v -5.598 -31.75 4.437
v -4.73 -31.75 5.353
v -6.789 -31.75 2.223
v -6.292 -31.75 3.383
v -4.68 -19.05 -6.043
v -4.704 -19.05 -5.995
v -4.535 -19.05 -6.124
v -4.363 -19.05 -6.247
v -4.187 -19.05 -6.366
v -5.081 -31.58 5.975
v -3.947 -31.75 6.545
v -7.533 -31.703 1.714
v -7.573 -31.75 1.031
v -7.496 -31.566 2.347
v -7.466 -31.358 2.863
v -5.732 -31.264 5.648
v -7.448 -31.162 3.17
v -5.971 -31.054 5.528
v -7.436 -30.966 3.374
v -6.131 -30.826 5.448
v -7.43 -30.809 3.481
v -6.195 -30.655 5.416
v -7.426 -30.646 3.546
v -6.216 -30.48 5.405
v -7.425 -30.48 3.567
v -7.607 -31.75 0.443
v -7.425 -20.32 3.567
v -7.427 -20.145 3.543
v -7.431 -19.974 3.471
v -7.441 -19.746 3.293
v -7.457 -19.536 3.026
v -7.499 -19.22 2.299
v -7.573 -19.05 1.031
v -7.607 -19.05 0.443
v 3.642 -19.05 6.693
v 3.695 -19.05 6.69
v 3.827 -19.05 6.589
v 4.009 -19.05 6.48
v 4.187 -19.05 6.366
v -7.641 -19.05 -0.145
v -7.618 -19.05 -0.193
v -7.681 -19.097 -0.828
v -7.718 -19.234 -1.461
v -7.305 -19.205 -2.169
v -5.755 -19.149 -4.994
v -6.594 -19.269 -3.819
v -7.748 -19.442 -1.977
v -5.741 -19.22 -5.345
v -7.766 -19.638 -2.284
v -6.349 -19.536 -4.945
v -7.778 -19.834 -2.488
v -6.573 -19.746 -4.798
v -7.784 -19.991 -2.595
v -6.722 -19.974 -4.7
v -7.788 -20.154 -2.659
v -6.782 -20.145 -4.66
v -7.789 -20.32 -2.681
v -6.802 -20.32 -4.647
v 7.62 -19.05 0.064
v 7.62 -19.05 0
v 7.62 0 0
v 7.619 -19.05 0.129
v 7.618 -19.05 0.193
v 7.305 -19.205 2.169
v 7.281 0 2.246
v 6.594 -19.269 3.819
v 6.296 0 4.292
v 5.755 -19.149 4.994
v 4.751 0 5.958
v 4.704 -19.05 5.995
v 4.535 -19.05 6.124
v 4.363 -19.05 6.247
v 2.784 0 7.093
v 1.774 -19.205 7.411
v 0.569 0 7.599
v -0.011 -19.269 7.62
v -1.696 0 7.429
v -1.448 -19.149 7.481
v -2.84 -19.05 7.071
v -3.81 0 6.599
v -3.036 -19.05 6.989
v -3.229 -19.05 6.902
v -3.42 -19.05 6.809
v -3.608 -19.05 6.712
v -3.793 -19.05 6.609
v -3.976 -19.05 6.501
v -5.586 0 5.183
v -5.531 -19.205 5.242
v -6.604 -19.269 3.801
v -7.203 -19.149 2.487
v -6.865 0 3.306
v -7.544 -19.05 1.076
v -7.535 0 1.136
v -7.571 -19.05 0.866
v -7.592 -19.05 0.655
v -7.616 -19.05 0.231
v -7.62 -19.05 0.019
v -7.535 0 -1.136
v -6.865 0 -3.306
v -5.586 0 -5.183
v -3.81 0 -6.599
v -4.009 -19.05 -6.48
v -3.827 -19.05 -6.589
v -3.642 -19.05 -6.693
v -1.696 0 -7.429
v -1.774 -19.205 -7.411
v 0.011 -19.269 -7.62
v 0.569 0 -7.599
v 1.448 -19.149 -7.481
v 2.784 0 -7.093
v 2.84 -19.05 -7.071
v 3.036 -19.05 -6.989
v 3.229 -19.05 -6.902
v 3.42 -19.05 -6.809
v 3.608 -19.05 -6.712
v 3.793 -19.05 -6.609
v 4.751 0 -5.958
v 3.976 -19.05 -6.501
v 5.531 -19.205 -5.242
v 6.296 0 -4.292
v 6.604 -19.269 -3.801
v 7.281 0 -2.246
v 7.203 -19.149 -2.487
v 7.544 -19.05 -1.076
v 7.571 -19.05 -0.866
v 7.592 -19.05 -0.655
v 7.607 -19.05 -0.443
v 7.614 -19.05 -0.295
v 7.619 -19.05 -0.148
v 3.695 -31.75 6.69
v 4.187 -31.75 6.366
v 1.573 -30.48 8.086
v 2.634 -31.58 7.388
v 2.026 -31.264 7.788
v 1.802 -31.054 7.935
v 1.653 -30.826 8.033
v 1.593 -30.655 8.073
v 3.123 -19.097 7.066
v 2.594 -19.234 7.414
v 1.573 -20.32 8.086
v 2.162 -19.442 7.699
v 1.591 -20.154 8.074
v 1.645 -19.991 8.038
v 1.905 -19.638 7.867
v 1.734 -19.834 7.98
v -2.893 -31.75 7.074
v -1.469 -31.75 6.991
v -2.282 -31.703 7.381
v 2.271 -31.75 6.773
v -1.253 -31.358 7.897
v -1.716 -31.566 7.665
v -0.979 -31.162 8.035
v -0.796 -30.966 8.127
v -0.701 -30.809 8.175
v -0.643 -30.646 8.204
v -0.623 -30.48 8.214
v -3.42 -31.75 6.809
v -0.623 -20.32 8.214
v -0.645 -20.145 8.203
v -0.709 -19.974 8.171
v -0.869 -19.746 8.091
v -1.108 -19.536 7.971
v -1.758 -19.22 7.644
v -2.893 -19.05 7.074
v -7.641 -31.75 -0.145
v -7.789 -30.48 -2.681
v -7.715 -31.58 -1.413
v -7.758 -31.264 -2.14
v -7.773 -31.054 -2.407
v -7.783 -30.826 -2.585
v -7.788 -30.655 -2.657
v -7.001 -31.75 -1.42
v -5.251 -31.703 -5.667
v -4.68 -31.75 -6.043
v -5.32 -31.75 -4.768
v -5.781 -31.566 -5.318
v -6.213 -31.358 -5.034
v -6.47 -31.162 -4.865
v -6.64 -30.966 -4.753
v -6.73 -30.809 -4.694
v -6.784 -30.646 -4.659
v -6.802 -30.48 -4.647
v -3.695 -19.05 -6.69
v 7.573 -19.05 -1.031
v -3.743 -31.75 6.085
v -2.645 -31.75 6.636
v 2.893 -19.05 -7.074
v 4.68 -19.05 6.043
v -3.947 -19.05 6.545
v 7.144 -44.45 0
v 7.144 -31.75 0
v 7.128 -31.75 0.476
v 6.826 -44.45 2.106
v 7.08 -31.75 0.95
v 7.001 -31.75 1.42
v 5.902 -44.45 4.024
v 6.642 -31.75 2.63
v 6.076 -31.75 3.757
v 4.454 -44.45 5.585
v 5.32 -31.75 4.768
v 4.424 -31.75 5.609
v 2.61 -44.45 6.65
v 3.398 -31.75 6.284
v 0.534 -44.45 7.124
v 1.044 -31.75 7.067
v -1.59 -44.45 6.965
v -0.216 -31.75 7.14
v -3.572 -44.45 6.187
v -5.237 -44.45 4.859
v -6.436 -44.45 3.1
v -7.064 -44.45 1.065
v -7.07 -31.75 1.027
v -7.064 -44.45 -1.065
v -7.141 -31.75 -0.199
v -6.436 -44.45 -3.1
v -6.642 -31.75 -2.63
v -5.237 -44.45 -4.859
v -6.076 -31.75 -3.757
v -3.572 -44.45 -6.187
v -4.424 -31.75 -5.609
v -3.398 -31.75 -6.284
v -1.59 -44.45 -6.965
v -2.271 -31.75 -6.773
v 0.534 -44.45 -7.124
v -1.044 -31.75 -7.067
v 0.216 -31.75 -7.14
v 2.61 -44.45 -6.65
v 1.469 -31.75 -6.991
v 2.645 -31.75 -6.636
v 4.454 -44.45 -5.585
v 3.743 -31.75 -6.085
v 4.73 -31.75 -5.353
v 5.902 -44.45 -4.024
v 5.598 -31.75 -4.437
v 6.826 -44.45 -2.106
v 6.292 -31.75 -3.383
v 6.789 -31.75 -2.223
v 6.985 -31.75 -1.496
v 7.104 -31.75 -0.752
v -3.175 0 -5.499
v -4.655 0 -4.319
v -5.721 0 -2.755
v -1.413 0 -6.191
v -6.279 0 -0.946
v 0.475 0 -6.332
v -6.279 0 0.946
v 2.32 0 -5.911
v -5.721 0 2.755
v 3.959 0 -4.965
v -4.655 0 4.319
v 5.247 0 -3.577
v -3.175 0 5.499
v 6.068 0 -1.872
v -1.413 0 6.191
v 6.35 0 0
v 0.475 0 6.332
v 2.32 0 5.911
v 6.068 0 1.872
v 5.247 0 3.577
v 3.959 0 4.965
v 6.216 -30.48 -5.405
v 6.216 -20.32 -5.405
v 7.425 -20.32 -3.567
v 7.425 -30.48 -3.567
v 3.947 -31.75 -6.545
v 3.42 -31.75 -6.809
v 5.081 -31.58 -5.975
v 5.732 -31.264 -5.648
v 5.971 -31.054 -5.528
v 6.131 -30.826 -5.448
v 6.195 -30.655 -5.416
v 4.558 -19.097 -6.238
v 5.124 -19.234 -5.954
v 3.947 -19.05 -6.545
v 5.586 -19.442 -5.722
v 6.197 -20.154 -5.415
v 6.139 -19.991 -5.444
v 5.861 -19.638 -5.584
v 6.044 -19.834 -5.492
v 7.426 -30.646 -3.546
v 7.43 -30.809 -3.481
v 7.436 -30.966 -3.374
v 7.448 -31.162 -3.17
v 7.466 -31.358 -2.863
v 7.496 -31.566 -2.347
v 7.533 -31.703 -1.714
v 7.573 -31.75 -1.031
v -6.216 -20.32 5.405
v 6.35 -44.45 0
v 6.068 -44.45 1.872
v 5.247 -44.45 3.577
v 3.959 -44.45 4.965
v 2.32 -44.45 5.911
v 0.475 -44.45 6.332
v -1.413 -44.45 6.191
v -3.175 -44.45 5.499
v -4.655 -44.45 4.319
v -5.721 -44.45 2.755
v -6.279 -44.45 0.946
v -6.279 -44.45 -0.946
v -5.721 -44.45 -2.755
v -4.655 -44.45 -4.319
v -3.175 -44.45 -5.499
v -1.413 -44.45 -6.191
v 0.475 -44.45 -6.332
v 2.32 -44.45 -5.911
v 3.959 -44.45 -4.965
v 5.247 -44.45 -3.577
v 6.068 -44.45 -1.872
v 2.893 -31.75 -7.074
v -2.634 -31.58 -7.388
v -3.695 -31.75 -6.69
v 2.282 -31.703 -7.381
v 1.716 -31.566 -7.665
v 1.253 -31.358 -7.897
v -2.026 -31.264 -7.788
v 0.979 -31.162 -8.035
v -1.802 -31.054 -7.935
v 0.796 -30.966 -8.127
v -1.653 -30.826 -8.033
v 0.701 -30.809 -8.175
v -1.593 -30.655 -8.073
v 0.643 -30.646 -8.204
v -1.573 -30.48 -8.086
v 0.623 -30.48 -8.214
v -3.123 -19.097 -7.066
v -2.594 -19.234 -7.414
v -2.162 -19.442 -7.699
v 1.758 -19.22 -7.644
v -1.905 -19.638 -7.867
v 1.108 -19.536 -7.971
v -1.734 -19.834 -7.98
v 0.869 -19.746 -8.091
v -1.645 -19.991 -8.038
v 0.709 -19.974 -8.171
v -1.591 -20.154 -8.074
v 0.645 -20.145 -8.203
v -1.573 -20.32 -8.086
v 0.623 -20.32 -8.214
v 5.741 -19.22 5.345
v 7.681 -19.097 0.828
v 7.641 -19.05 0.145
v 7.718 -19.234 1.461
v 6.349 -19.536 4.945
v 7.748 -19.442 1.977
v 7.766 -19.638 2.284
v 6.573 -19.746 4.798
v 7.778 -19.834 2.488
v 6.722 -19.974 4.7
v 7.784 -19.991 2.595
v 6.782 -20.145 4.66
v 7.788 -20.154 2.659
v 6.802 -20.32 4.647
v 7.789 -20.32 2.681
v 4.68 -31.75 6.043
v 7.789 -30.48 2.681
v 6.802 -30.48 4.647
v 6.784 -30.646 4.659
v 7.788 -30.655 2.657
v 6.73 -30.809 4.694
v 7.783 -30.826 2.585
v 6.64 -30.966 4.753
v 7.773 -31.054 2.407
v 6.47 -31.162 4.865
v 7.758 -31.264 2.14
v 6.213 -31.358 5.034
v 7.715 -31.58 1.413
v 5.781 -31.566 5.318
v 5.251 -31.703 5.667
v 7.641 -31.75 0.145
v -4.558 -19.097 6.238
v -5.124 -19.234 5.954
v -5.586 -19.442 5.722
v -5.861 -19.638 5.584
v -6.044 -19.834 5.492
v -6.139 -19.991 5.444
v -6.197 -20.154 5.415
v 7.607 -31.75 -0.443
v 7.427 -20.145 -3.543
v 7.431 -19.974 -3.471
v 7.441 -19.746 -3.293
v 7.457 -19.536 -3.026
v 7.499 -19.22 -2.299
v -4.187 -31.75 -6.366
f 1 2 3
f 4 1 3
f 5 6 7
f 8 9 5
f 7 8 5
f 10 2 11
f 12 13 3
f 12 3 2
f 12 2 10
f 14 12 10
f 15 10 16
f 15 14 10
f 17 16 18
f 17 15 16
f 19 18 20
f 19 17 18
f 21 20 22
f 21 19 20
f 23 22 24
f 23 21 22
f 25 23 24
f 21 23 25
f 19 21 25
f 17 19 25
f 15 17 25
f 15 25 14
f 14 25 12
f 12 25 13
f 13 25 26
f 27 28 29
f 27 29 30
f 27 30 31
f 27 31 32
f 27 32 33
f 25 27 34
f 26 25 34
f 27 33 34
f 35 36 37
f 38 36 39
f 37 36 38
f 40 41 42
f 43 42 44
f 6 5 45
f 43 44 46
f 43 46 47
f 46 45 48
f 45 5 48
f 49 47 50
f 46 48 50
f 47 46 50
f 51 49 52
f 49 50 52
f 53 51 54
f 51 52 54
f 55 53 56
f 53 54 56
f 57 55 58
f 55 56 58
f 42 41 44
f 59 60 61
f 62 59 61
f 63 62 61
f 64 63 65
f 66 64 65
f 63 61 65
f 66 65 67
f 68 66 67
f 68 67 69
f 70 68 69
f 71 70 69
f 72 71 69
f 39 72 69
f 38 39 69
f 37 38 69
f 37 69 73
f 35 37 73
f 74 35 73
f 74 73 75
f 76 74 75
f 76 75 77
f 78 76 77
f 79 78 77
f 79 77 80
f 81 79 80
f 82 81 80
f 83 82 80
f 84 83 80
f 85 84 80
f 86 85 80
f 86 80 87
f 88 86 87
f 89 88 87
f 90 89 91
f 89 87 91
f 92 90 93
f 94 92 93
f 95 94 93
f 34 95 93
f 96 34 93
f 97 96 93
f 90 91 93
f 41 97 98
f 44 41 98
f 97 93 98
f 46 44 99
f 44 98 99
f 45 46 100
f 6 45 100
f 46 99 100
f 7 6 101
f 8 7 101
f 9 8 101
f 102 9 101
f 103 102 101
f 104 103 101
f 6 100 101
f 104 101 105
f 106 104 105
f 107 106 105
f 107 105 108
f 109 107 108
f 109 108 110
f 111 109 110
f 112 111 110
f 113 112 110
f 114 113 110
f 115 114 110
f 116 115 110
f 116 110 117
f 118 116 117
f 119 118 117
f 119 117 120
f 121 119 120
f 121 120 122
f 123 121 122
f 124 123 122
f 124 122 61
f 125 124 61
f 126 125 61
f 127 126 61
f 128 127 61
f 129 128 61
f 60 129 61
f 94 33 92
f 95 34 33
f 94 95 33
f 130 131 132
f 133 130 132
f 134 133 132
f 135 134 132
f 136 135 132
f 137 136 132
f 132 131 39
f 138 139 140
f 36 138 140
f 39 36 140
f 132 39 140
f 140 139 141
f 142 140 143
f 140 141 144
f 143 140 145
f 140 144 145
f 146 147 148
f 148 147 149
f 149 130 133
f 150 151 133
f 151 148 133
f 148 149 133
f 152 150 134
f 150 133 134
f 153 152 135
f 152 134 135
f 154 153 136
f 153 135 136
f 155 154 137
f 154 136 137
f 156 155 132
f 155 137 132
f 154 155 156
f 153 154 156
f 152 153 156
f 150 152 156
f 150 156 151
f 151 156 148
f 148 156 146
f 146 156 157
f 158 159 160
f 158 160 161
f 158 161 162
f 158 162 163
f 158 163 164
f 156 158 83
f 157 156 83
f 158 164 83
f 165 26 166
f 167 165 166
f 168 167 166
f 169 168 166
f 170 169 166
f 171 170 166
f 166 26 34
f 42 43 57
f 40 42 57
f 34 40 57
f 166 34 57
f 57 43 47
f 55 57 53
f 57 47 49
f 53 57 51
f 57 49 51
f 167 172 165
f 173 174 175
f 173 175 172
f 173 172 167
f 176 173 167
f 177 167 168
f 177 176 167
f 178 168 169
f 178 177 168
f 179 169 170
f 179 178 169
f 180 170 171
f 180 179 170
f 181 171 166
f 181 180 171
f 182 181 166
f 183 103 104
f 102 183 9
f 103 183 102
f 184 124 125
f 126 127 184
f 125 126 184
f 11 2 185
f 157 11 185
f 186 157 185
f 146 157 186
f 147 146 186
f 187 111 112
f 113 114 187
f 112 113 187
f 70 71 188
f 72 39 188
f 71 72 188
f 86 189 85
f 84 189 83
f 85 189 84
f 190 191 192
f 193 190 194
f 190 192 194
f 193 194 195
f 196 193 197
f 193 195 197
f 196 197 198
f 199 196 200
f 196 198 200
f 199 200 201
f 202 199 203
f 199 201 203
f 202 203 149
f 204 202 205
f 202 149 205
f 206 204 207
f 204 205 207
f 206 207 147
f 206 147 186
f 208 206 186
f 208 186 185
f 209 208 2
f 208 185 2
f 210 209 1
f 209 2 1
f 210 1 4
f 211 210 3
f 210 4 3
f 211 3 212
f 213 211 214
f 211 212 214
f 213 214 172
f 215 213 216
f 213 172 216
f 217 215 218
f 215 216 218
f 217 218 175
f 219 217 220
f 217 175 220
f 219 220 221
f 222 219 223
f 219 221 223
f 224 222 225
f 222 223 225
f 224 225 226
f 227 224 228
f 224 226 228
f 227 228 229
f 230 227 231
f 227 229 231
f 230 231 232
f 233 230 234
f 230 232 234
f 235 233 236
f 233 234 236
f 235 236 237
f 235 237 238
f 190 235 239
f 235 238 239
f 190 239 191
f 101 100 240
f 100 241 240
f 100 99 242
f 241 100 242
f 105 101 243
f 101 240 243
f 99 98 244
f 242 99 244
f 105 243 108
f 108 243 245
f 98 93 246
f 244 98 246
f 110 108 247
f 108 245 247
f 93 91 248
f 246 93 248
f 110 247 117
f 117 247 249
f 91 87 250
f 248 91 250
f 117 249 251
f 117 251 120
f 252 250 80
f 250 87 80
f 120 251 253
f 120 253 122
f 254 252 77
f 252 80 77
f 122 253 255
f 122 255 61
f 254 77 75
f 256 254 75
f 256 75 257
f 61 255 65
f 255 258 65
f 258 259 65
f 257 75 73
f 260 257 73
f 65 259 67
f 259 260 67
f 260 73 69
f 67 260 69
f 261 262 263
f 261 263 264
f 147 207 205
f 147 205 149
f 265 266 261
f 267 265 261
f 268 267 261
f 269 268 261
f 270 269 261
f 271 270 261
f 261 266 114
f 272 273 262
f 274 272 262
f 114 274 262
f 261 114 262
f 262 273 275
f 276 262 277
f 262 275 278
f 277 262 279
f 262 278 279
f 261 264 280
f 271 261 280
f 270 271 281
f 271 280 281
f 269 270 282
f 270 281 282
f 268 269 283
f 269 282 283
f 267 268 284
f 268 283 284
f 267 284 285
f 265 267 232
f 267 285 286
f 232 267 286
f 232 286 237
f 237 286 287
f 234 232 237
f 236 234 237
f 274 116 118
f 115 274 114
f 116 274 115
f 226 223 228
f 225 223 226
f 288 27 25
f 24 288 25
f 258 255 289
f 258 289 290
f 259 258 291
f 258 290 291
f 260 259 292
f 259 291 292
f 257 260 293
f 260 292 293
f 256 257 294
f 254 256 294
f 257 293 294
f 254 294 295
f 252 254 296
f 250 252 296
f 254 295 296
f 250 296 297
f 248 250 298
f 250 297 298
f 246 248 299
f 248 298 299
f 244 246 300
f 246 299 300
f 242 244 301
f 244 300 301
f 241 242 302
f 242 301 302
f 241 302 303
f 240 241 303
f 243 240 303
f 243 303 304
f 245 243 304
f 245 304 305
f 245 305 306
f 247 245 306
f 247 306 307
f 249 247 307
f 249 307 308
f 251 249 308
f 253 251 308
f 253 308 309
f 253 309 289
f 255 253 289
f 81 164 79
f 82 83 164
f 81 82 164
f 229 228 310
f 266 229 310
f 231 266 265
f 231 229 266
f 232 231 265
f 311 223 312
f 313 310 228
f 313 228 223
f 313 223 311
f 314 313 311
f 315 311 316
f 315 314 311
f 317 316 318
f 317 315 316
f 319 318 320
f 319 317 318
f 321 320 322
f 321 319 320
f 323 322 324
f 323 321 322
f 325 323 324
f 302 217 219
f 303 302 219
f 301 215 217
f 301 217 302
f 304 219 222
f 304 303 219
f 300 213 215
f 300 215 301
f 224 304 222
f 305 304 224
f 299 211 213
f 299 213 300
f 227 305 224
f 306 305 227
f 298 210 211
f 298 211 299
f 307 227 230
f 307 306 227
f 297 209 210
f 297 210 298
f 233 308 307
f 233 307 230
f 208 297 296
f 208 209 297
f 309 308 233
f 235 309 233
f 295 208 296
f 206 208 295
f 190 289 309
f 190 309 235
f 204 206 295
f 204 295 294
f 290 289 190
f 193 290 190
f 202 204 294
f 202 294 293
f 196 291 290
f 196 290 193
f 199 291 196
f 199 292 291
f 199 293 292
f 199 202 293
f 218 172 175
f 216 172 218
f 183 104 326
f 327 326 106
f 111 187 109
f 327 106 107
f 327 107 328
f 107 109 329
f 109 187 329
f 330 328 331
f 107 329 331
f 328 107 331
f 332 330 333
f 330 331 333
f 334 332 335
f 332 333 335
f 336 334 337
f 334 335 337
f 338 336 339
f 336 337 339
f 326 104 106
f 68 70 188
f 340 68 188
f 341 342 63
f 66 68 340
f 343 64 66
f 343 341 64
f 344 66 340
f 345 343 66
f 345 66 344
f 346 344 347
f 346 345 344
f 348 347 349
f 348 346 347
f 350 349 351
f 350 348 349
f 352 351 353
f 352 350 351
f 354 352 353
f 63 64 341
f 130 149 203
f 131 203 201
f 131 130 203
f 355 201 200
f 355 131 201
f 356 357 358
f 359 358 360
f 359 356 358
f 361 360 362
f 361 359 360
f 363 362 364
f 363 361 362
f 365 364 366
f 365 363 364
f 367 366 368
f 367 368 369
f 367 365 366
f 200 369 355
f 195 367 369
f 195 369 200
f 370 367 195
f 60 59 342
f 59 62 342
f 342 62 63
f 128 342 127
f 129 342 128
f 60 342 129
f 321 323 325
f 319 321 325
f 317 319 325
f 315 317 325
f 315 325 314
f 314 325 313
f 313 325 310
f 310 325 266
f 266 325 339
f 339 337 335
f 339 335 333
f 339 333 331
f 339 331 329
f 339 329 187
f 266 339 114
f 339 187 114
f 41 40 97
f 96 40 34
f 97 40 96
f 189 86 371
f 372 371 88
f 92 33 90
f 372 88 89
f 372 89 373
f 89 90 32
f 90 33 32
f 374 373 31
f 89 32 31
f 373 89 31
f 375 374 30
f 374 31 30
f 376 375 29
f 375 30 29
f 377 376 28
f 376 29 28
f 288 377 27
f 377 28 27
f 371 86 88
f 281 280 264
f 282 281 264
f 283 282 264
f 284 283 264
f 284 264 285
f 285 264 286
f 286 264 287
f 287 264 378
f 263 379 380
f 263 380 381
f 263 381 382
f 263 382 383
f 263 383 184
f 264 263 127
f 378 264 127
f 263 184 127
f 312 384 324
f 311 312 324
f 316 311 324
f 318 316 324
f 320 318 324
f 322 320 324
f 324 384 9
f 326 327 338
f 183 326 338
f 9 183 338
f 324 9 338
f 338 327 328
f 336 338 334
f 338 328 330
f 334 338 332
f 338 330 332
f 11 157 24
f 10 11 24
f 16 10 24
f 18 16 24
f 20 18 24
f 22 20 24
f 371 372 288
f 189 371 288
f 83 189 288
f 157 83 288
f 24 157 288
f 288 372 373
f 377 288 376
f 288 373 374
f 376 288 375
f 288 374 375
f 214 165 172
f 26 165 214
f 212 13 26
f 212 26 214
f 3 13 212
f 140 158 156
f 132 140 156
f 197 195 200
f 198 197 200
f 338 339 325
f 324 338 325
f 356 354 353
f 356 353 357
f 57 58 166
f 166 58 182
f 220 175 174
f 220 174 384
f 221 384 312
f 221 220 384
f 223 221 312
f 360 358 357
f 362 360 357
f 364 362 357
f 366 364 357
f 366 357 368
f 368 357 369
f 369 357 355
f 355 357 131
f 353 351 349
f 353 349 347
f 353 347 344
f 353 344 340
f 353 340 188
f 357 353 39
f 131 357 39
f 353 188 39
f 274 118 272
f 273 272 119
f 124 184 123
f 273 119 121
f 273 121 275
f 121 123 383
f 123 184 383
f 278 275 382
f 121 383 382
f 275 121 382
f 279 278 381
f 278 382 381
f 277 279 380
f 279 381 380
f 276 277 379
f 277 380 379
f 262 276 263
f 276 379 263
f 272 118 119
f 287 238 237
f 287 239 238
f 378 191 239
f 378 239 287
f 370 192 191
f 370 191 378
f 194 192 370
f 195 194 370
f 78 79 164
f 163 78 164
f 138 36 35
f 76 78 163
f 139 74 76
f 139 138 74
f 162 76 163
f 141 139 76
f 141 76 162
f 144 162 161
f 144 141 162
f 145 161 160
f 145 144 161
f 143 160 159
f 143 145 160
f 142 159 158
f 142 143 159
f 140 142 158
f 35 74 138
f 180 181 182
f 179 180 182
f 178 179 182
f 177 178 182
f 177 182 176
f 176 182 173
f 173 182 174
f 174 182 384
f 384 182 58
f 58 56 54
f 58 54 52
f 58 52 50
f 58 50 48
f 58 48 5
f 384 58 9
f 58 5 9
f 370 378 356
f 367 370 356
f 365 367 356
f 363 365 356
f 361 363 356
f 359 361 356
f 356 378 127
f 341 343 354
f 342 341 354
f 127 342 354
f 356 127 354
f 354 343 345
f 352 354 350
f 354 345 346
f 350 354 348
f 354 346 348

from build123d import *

# Parameters (mm, degrees)
F0_R         = 7.62
F1_DEPTH     = 19.05
F3_DEPTH     = 12.7
F4_SIZE      = 1.27
F5_T1_DEPTH  = 8.5497045256
F5_T3_DEPTH  = 8.5497045256
F5_T5_DEPTH  = 8.5497045256
F5_T7_DEPTH  = 8.5497045256
F5_T12_DEPTH = 8.5497045256
F5_S13_R     = 7.62
F5_T14_DEPTH = 6
F5_T18_DEPTH = 8.5497045256
F5_S19_R     = 7.62
F5_T20_DEPTH = 6
F5_T24_DEPTH = 8.5497045256
F5_S25_R     = 7.62
F5_T26_DEPTH = 6
F5_T30_DEPTH = 8.5497045256
F5_S31_R     = 7.62
F5_T32_DEPTH = 6
F5_T36_DEPTH = 8.5497045256
F5_S37_R     = 7.62
F5_T38_DEPTH = 6
F5_T42_DEPTH = 8.5497045256
F5_S43_R     = 7.62
F5_T44_DEPTH = 6
F6_R         = 7.14375
F7_DEPTH     = 12.7
F8_R         = 6.35
F9_DEPTH     = 44.4510001


# Not quite as in the source:
# - a fillet or chamfer that OpenCascade refuses, or shapes differently, is made with other operations: its cross-section is extruded or revolved along the edge and cut away or added


with BuildPart() as f1:
    # F0 (on Front) → F1 (new body)
    with BuildSketch(Plane.XZ):
        Circle(F0_R)
    extrude(amount=F1_DEPTH)

    # F2 (on face) → F3 (join)
    with BuildSketch(Plane.XZ.offset(19.05)):
        with BuildLine():
            Line((7.8629215405, 3.9488814679), (4.1872753391, 6.3664059904))
            ThreePointArc((4.1872753391, 6.3664059904), (6.7071394083, 3.6164459015), (7.62, 0))
            ThreePointArc((7.62, 0), (7.616776064, -0.2216357159), (7.6071069841, -0.4430838887))
            Line((7.6071069841, -0.4430838887), (7.8629215405, 3.9488814679))
        make_face()
        with BuildLine():
            ThreePointArc((4.1872753391, 6.3664059904), (0.4430838236, 7.6071069879), (-3.4198316443, 6.8094898138))
            ThreePointArc((-3.4198316443, 6.8094898138), (-6.3664059346, 4.187275424), (-7.6071069765, 0.4430840189))
            ThreePointArc((-7.6071069765, 0.4430840189), (-6.8094898664, -3.4198315396), (-4.187275378, -6.3664059648))
            ThreePointArc((-4.187275378, -6.3664059648), (-0.4430838337, -7.6071069873), (3.419831668, -6.8094898019))
            ThreePointArc((3.419831668, -6.8094898019), (6.3664059777, -4.1872753585), (7.6071069841, -0.4430838887))
            ThreePointArc((7.6071069841, -0.4430838887), (7.616776064, -0.2216357159), (7.62, 0))
            ThreePointArc((7.62, 0), (6.7071394083, 3.6164459015), (4.1872753391, 6.3664059904))
        make_face()
        with BuildLine():
            ThreePointArc((7.6071069841, -0.4430838887), (6.3664059777, -4.1872753585), (3.419831668, -6.8094898019))
            Line((3.419831668, -6.8094898019), (7.351292438, -4.8350490681))
            Line((7.351292438, -4.8350490681), (7.6071069841, -0.4430838887))
        make_face()
        with BuildLine():
            ThreePointArc((3.419831668, -6.8094898019), (-0.4430838337, -7.6071069873), (-4.187275378, -6.3664059648))
            Line((-4.187275378, -6.3664059648), (-0.5116291025, -8.783930536))
            Line((-0.5116291025, -8.783930536), (3.419831668, -6.8094898019))
        make_face()
        with BuildLine():
            ThreePointArc((-4.187275378, -6.3664059648), (-6.8094898664, -3.4198315396), (-7.6071069765, 0.4430840189))
            Line((-7.6071069765, 0.4430840189), (-7.8629215405, -3.9488814679))
            Line((-7.8629215405, -3.9488814679), (-4.187275378, -6.3664059648))
        make_face()
        with BuildLine():
            Line((-3.4198316443, 6.8094898138), (-7.351292438, 4.8350490681))
            Line((-7.351292438, 4.8350490681), (-7.6071069765, 0.4430840189))
            ThreePointArc((-7.6071069765, 0.4430840189), (-6.3664059346, 4.187275424), (-3.4198316443, 6.8094898138))
        make_face()
        with BuildLine():
            Line((0.5116291025, 8.783930536), (-3.4198316443, 6.8094898138))
            ThreePointArc((-3.4198316443, 6.8094898138), (0.4430838236, 7.6071069879), (4.1872753391, 6.3664059904))
            Line((4.1872753391, 6.3664059904), (0.5116291025, 8.783930536))
        make_face()
    extrude(amount=F3_DEPTH)

    # F4
    f4_edges = [f1.edges().sort_by_distance(p)[0] for p in [
        (7.862922, -25.4, 3.948881),
        (7.351292, -25.4, -4.835049),
        (-0.511629, -25.4, -8.783931),
        (-7.862922, -25.4, -3.948881),
        (-7.351292, -25.4, 4.835049),
        (0.511629, -25.4, 8.783931),
    ]]
    chamfer(f4_edges, length=F4_SIZE)

    # F5: fillet of radius 1.27 on 12 edges, made by hand

    # F5_s2 → F5_t1 (cut)
    with BuildSketch(Plane(origin=(1.918540045, 0, -3.8201526101), x_dir=(0, 1, 0), z_dir=(-0.4487968068, 0, 0.8936338323))):
        with BuildLine():
            ThreePointArc((-30.48, -8.1638181024), (-31.3780256121, -7.7918437146), (-31.75, -6.8938181024))
            Line((-31.75, -6.8938181024), (-31.75, -8.1638181024))
            Line((-31.75, -8.1638181024), (-30.48, -8.1638181024))
        make_face()
        with BuildLine():
            ThreePointArc((-31.75, 6.8938181024), (-31.3780256121, 7.7918437146), (-30.48, 8.1638181024))
            Line((-30.48, 8.1638181024), (-31.75, 8.1638181024))
            Line((-31.75, 8.1638181024), (-31.75, 6.8938181024))
        make_face()
    extrude(amount=F5_T1_DEPTH, mode=Mode.SUBTRACT)

    # F5_s4 → F5_t3 (cut)
    with BuildSketch(Plane(origin=(4.2676192292, 0, -0.2485718879), x_dir=(0, 1, 0), z_dir=(-0.9983080038, 0, 0.0581474803))):
        with BuildLine():
            ThreePointArc((-31.75, -6.8938181024), (-31.3780256121, -7.7918437146), (-30.48, -8.1638181024))
            Line((-30.48, -8.1638181024), (-31.75, -8.1638181024))
            Line((-31.75, -8.1638181024), (-31.75, -6.8938181024))
        make_face()
        with BuildLine():
            ThreePointArc((-31.75, 6.8938181024), (-31.3780256121, 7.7918437146), (-30.48, 8.1638181024))
            Line((-30.48, 8.1638181024), (-31.75, 8.1638181024))
            Line((-31.75, 8.1638181024), (-31.75, 6.8938181024))
        make_face()
    extrude(amount=F5_T3_DEPTH, mode=Mode.SUBTRACT)

    # F5_s6 → F5_t5 (cut)
    with BuildSketch(Plane(origin=(-2.3490791841, 0, -3.5715807222), x_dir=(0, 1, 0), z_dir=(0.5495111971, 0, 0.835486352))):
        with BuildLine():
            ThreePointArc((-31.75, 6.8938181024), (-31.3780256121, 7.7918437146), (-30.48, 8.1638181024))
            Line((-30.48, 8.1638181024), (-31.75, 8.1638181024))
            Line((-31.75, 8.1638181024), (-31.75, 6.8938181024))
        make_face()
    extrude(amount=F5_T5_DEPTH, mode=Mode.SUBTRACT)

    # F5_s8 → F5_t7 (cut)
    with BuildSketch(Plane(origin=(2.3490791841, 0, 3.5715807222), x_dir=(0, 1, 0), z_dir=(-0.5495111971, 0, -0.835486352))):
        with BuildLine():
            ThreePointArc((-30.48, 8.1638181024), (-31.3780256121, 7.7918437146), (-31.75, 6.8938181024))
            Line((-31.75, 6.8938181024), (-31.75, 8.1638181024))
            Line((-31.75, 8.1638181024), (-30.48, 8.1638181024))
        make_face()
    extrude(amount=F5_T7_DEPTH, mode=Mode.SUBTRACT)


with BuildPart() as f5_tool10:
    # F5_s11 → F5_t12 (new body)
    with BuildSketch(Plane(origin=(4.2676192292, 0, -0.2485718879), x_dir=(0, 1, 0), z_dir=(-0.9983080038, 0, 0.0581474803))):
        with BuildLine():
            ThreePointArc((-19.05, -6.8938181024), (-19.4219743879, -7.7918437146), (-20.32, -8.1638181024))
            Line((-20.32, -8.1638181024), (-19.05, -8.1638181024))
            Line((-19.05, -8.1638181024), (-19.05, -6.8938181024))
        make_face()
    extrude(amount=F5_T12_DEPTH)

    # F5_s13 → F5_t14 (cut, symmetric)
    with BuildSketch(Plane.XZ.offset(19.7)):
        Circle(F5_S13_R)
    extrude(amount=F5_T14_DEPTH, both=True, mode=Mode.SUBTRACT)


with BuildPart() as f1_1:
    add(f1.part)

    # F5_t9: cut F5_tool10
    add(f5_tool10.part, mode=Mode.SUBTRACT)


with BuildPart() as f5_tool16:
    # F5_s17 → F5_t18 (new body)
    with BuildSketch(Plane(origin=(-2.3490791841, 0, -3.5715807222), x_dir=(0, 1, 0), z_dir=(0.5495111971, 0, 0.835486352))):
        with BuildLine():
            ThreePointArc((-19.05, 6.8938181024), (-19.4219743879, 7.7918437146), (-20.32, 8.1638181024))
            Line((-20.32, 8.1638181024), (-19.05, 8.1638181024))
            Line((-19.05, 8.1638181024), (-19.05, 6.8938181024))
        make_face()
    extrude(amount=F5_T18_DEPTH)

    # F5_s19 → F5_t20 (cut, symmetric)
    with BuildSketch(Plane.XZ.offset(19.7)):
        Circle(F5_S19_R)
    extrude(amount=F5_T20_DEPTH, both=True, mode=Mode.SUBTRACT)


with BuildPart() as f1_2:
    add(f1_1.part)

    # F5_t15: cut F5_tool16
    add(f5_tool16.part, mode=Mode.SUBTRACT)


with BuildPart() as f5_tool22:
    # F5_s23 → F5_t24 (new body)
    with BuildSketch(Plane(origin=(1.918540045, 0, -3.8201526101), x_dir=(0, 1, 0), z_dir=(-0.4487968068, 0, 0.8936338323))):
        with BuildLine():
            ThreePointArc((-19.05, 6.8938181024), (-19.4219743879, 7.7918437146), (-20.32, 8.1638181024))
            Line((-20.32, 8.1638181024), (-19.05, 8.1638181024))
            Line((-19.05, 8.1638181024), (-19.05, 6.8938181024))
        make_face()
    extrude(amount=F5_T24_DEPTH)

    # F5_s25 → F5_t26 (cut, symmetric)
    with BuildSketch(Plane.XZ.offset(19.7)):
        Circle(F5_S25_R)
    extrude(amount=F5_T26_DEPTH, both=True, mode=Mode.SUBTRACT)


with BuildPart() as f1_3:
    add(f1_2.part)

    # F5_t21: cut F5_tool22
    add(f5_tool22.part, mode=Mode.SUBTRACT)


with BuildPart() as f5_tool28:
    # F5_s29 → F5_t30 (new body)
    with BuildSketch(Plane(origin=(4.2676192292, 0, -0.2485718879), x_dir=(0, 1, 0), z_dir=(-0.9983080038, 0, 0.0581474803))):
        with BuildLine():
            ThreePointArc((-19.05, 6.8938181024), (-19.4219743879, 7.7918437146), (-20.32, 8.1638181024))
            Line((-20.32, 8.1638181024), (-19.05, 8.1638181024))
            Line((-19.05, 8.1638181024), (-19.05, 6.8938181024))
        make_face()
    extrude(amount=F5_T30_DEPTH)

    # F5_s31 → F5_t32 (cut, symmetric)
    with BuildSketch(Plane.XZ.offset(19.7)):
        Circle(F5_S31_R)
    extrude(amount=F5_T32_DEPTH, both=True, mode=Mode.SUBTRACT)


with BuildPart() as f1_4:
    add(f1_3.part)

    # F5_t27: cut F5_tool28
    add(f5_tool28.part, mode=Mode.SUBTRACT)


with BuildPart() as f5_tool34:
    # F5_s35 → F5_t36 (new body)
    with BuildSketch(Plane(origin=(2.3490791841, 0, 3.5715807222), x_dir=(0, 1, 0), z_dir=(-0.5495111971, 0, -0.835486352))):
        with BuildLine():
            ThreePointArc((-19.05, 6.8938181024), (-19.4219743879, 7.7918437146), (-20.32, 8.1638181024))
            Line((-20.32, 8.1638181024), (-19.05, 8.1638181024))
            Line((-19.05, 8.1638181024), (-19.05, 6.8938181024))
        make_face()
    extrude(amount=F5_T36_DEPTH)

    # F5_s37 → F5_t38 (cut, symmetric)
    with BuildSketch(Plane.XZ.offset(19.7)):
        Circle(F5_S37_R)
    extrude(amount=F5_T38_DEPTH, both=True, mode=Mode.SUBTRACT)


with BuildPart() as f1_5:
    add(f1_4.part)

    # F5_t33: cut F5_tool34
    add(f5_tool34.part, mode=Mode.SUBTRACT)


with BuildPart() as f5_tool40:
    # F5_s41 → F5_t42 (new body)
    with BuildSketch(Plane(origin=(1.918540045, 0, -3.8201526101), x_dir=(0, 1, 0), z_dir=(-0.4487968068, 0, 0.8936338323))):
        with BuildLine():
            ThreePointArc((-19.05, -6.8938181024), (-19.4219743879, -7.7918437146), (-20.32, -8.1638181024))
            Line((-20.32, -8.1638181024), (-19.05, -8.1638181024))
            Line((-19.05, -8.1638181024), (-19.05, -6.8938181024))
        make_face()
    extrude(amount=F5_T42_DEPTH)

    # F5_s43 → F5_t44 (cut, symmetric)
    with BuildSketch(Plane.XZ.offset(19.7)):
        Circle(F5_S43_R)
    extrude(amount=F5_T44_DEPTH, both=True, mode=Mode.SUBTRACT)


with BuildPart() as f1_6:
    add(f1_5.part)

    # F5_t39: cut F5_tool40
    add(f5_tool40.part, mode=Mode.SUBTRACT)

    # F6 (on face) → F7 (join)
    with BuildSketch(Plane.XZ.offset(31.75)):
        Circle(F6_R)
    extrude(amount=F7_DEPTH)

    # F8 (on face) → F9 (cut, through all)
    with BuildSketch(Plane.XZ.offset(44.45)):
        Circle(F8_R)
    extrude(amount=-F9_DEPTH, mode=Mode.SUBTRACT)


solid = f1_6.part
